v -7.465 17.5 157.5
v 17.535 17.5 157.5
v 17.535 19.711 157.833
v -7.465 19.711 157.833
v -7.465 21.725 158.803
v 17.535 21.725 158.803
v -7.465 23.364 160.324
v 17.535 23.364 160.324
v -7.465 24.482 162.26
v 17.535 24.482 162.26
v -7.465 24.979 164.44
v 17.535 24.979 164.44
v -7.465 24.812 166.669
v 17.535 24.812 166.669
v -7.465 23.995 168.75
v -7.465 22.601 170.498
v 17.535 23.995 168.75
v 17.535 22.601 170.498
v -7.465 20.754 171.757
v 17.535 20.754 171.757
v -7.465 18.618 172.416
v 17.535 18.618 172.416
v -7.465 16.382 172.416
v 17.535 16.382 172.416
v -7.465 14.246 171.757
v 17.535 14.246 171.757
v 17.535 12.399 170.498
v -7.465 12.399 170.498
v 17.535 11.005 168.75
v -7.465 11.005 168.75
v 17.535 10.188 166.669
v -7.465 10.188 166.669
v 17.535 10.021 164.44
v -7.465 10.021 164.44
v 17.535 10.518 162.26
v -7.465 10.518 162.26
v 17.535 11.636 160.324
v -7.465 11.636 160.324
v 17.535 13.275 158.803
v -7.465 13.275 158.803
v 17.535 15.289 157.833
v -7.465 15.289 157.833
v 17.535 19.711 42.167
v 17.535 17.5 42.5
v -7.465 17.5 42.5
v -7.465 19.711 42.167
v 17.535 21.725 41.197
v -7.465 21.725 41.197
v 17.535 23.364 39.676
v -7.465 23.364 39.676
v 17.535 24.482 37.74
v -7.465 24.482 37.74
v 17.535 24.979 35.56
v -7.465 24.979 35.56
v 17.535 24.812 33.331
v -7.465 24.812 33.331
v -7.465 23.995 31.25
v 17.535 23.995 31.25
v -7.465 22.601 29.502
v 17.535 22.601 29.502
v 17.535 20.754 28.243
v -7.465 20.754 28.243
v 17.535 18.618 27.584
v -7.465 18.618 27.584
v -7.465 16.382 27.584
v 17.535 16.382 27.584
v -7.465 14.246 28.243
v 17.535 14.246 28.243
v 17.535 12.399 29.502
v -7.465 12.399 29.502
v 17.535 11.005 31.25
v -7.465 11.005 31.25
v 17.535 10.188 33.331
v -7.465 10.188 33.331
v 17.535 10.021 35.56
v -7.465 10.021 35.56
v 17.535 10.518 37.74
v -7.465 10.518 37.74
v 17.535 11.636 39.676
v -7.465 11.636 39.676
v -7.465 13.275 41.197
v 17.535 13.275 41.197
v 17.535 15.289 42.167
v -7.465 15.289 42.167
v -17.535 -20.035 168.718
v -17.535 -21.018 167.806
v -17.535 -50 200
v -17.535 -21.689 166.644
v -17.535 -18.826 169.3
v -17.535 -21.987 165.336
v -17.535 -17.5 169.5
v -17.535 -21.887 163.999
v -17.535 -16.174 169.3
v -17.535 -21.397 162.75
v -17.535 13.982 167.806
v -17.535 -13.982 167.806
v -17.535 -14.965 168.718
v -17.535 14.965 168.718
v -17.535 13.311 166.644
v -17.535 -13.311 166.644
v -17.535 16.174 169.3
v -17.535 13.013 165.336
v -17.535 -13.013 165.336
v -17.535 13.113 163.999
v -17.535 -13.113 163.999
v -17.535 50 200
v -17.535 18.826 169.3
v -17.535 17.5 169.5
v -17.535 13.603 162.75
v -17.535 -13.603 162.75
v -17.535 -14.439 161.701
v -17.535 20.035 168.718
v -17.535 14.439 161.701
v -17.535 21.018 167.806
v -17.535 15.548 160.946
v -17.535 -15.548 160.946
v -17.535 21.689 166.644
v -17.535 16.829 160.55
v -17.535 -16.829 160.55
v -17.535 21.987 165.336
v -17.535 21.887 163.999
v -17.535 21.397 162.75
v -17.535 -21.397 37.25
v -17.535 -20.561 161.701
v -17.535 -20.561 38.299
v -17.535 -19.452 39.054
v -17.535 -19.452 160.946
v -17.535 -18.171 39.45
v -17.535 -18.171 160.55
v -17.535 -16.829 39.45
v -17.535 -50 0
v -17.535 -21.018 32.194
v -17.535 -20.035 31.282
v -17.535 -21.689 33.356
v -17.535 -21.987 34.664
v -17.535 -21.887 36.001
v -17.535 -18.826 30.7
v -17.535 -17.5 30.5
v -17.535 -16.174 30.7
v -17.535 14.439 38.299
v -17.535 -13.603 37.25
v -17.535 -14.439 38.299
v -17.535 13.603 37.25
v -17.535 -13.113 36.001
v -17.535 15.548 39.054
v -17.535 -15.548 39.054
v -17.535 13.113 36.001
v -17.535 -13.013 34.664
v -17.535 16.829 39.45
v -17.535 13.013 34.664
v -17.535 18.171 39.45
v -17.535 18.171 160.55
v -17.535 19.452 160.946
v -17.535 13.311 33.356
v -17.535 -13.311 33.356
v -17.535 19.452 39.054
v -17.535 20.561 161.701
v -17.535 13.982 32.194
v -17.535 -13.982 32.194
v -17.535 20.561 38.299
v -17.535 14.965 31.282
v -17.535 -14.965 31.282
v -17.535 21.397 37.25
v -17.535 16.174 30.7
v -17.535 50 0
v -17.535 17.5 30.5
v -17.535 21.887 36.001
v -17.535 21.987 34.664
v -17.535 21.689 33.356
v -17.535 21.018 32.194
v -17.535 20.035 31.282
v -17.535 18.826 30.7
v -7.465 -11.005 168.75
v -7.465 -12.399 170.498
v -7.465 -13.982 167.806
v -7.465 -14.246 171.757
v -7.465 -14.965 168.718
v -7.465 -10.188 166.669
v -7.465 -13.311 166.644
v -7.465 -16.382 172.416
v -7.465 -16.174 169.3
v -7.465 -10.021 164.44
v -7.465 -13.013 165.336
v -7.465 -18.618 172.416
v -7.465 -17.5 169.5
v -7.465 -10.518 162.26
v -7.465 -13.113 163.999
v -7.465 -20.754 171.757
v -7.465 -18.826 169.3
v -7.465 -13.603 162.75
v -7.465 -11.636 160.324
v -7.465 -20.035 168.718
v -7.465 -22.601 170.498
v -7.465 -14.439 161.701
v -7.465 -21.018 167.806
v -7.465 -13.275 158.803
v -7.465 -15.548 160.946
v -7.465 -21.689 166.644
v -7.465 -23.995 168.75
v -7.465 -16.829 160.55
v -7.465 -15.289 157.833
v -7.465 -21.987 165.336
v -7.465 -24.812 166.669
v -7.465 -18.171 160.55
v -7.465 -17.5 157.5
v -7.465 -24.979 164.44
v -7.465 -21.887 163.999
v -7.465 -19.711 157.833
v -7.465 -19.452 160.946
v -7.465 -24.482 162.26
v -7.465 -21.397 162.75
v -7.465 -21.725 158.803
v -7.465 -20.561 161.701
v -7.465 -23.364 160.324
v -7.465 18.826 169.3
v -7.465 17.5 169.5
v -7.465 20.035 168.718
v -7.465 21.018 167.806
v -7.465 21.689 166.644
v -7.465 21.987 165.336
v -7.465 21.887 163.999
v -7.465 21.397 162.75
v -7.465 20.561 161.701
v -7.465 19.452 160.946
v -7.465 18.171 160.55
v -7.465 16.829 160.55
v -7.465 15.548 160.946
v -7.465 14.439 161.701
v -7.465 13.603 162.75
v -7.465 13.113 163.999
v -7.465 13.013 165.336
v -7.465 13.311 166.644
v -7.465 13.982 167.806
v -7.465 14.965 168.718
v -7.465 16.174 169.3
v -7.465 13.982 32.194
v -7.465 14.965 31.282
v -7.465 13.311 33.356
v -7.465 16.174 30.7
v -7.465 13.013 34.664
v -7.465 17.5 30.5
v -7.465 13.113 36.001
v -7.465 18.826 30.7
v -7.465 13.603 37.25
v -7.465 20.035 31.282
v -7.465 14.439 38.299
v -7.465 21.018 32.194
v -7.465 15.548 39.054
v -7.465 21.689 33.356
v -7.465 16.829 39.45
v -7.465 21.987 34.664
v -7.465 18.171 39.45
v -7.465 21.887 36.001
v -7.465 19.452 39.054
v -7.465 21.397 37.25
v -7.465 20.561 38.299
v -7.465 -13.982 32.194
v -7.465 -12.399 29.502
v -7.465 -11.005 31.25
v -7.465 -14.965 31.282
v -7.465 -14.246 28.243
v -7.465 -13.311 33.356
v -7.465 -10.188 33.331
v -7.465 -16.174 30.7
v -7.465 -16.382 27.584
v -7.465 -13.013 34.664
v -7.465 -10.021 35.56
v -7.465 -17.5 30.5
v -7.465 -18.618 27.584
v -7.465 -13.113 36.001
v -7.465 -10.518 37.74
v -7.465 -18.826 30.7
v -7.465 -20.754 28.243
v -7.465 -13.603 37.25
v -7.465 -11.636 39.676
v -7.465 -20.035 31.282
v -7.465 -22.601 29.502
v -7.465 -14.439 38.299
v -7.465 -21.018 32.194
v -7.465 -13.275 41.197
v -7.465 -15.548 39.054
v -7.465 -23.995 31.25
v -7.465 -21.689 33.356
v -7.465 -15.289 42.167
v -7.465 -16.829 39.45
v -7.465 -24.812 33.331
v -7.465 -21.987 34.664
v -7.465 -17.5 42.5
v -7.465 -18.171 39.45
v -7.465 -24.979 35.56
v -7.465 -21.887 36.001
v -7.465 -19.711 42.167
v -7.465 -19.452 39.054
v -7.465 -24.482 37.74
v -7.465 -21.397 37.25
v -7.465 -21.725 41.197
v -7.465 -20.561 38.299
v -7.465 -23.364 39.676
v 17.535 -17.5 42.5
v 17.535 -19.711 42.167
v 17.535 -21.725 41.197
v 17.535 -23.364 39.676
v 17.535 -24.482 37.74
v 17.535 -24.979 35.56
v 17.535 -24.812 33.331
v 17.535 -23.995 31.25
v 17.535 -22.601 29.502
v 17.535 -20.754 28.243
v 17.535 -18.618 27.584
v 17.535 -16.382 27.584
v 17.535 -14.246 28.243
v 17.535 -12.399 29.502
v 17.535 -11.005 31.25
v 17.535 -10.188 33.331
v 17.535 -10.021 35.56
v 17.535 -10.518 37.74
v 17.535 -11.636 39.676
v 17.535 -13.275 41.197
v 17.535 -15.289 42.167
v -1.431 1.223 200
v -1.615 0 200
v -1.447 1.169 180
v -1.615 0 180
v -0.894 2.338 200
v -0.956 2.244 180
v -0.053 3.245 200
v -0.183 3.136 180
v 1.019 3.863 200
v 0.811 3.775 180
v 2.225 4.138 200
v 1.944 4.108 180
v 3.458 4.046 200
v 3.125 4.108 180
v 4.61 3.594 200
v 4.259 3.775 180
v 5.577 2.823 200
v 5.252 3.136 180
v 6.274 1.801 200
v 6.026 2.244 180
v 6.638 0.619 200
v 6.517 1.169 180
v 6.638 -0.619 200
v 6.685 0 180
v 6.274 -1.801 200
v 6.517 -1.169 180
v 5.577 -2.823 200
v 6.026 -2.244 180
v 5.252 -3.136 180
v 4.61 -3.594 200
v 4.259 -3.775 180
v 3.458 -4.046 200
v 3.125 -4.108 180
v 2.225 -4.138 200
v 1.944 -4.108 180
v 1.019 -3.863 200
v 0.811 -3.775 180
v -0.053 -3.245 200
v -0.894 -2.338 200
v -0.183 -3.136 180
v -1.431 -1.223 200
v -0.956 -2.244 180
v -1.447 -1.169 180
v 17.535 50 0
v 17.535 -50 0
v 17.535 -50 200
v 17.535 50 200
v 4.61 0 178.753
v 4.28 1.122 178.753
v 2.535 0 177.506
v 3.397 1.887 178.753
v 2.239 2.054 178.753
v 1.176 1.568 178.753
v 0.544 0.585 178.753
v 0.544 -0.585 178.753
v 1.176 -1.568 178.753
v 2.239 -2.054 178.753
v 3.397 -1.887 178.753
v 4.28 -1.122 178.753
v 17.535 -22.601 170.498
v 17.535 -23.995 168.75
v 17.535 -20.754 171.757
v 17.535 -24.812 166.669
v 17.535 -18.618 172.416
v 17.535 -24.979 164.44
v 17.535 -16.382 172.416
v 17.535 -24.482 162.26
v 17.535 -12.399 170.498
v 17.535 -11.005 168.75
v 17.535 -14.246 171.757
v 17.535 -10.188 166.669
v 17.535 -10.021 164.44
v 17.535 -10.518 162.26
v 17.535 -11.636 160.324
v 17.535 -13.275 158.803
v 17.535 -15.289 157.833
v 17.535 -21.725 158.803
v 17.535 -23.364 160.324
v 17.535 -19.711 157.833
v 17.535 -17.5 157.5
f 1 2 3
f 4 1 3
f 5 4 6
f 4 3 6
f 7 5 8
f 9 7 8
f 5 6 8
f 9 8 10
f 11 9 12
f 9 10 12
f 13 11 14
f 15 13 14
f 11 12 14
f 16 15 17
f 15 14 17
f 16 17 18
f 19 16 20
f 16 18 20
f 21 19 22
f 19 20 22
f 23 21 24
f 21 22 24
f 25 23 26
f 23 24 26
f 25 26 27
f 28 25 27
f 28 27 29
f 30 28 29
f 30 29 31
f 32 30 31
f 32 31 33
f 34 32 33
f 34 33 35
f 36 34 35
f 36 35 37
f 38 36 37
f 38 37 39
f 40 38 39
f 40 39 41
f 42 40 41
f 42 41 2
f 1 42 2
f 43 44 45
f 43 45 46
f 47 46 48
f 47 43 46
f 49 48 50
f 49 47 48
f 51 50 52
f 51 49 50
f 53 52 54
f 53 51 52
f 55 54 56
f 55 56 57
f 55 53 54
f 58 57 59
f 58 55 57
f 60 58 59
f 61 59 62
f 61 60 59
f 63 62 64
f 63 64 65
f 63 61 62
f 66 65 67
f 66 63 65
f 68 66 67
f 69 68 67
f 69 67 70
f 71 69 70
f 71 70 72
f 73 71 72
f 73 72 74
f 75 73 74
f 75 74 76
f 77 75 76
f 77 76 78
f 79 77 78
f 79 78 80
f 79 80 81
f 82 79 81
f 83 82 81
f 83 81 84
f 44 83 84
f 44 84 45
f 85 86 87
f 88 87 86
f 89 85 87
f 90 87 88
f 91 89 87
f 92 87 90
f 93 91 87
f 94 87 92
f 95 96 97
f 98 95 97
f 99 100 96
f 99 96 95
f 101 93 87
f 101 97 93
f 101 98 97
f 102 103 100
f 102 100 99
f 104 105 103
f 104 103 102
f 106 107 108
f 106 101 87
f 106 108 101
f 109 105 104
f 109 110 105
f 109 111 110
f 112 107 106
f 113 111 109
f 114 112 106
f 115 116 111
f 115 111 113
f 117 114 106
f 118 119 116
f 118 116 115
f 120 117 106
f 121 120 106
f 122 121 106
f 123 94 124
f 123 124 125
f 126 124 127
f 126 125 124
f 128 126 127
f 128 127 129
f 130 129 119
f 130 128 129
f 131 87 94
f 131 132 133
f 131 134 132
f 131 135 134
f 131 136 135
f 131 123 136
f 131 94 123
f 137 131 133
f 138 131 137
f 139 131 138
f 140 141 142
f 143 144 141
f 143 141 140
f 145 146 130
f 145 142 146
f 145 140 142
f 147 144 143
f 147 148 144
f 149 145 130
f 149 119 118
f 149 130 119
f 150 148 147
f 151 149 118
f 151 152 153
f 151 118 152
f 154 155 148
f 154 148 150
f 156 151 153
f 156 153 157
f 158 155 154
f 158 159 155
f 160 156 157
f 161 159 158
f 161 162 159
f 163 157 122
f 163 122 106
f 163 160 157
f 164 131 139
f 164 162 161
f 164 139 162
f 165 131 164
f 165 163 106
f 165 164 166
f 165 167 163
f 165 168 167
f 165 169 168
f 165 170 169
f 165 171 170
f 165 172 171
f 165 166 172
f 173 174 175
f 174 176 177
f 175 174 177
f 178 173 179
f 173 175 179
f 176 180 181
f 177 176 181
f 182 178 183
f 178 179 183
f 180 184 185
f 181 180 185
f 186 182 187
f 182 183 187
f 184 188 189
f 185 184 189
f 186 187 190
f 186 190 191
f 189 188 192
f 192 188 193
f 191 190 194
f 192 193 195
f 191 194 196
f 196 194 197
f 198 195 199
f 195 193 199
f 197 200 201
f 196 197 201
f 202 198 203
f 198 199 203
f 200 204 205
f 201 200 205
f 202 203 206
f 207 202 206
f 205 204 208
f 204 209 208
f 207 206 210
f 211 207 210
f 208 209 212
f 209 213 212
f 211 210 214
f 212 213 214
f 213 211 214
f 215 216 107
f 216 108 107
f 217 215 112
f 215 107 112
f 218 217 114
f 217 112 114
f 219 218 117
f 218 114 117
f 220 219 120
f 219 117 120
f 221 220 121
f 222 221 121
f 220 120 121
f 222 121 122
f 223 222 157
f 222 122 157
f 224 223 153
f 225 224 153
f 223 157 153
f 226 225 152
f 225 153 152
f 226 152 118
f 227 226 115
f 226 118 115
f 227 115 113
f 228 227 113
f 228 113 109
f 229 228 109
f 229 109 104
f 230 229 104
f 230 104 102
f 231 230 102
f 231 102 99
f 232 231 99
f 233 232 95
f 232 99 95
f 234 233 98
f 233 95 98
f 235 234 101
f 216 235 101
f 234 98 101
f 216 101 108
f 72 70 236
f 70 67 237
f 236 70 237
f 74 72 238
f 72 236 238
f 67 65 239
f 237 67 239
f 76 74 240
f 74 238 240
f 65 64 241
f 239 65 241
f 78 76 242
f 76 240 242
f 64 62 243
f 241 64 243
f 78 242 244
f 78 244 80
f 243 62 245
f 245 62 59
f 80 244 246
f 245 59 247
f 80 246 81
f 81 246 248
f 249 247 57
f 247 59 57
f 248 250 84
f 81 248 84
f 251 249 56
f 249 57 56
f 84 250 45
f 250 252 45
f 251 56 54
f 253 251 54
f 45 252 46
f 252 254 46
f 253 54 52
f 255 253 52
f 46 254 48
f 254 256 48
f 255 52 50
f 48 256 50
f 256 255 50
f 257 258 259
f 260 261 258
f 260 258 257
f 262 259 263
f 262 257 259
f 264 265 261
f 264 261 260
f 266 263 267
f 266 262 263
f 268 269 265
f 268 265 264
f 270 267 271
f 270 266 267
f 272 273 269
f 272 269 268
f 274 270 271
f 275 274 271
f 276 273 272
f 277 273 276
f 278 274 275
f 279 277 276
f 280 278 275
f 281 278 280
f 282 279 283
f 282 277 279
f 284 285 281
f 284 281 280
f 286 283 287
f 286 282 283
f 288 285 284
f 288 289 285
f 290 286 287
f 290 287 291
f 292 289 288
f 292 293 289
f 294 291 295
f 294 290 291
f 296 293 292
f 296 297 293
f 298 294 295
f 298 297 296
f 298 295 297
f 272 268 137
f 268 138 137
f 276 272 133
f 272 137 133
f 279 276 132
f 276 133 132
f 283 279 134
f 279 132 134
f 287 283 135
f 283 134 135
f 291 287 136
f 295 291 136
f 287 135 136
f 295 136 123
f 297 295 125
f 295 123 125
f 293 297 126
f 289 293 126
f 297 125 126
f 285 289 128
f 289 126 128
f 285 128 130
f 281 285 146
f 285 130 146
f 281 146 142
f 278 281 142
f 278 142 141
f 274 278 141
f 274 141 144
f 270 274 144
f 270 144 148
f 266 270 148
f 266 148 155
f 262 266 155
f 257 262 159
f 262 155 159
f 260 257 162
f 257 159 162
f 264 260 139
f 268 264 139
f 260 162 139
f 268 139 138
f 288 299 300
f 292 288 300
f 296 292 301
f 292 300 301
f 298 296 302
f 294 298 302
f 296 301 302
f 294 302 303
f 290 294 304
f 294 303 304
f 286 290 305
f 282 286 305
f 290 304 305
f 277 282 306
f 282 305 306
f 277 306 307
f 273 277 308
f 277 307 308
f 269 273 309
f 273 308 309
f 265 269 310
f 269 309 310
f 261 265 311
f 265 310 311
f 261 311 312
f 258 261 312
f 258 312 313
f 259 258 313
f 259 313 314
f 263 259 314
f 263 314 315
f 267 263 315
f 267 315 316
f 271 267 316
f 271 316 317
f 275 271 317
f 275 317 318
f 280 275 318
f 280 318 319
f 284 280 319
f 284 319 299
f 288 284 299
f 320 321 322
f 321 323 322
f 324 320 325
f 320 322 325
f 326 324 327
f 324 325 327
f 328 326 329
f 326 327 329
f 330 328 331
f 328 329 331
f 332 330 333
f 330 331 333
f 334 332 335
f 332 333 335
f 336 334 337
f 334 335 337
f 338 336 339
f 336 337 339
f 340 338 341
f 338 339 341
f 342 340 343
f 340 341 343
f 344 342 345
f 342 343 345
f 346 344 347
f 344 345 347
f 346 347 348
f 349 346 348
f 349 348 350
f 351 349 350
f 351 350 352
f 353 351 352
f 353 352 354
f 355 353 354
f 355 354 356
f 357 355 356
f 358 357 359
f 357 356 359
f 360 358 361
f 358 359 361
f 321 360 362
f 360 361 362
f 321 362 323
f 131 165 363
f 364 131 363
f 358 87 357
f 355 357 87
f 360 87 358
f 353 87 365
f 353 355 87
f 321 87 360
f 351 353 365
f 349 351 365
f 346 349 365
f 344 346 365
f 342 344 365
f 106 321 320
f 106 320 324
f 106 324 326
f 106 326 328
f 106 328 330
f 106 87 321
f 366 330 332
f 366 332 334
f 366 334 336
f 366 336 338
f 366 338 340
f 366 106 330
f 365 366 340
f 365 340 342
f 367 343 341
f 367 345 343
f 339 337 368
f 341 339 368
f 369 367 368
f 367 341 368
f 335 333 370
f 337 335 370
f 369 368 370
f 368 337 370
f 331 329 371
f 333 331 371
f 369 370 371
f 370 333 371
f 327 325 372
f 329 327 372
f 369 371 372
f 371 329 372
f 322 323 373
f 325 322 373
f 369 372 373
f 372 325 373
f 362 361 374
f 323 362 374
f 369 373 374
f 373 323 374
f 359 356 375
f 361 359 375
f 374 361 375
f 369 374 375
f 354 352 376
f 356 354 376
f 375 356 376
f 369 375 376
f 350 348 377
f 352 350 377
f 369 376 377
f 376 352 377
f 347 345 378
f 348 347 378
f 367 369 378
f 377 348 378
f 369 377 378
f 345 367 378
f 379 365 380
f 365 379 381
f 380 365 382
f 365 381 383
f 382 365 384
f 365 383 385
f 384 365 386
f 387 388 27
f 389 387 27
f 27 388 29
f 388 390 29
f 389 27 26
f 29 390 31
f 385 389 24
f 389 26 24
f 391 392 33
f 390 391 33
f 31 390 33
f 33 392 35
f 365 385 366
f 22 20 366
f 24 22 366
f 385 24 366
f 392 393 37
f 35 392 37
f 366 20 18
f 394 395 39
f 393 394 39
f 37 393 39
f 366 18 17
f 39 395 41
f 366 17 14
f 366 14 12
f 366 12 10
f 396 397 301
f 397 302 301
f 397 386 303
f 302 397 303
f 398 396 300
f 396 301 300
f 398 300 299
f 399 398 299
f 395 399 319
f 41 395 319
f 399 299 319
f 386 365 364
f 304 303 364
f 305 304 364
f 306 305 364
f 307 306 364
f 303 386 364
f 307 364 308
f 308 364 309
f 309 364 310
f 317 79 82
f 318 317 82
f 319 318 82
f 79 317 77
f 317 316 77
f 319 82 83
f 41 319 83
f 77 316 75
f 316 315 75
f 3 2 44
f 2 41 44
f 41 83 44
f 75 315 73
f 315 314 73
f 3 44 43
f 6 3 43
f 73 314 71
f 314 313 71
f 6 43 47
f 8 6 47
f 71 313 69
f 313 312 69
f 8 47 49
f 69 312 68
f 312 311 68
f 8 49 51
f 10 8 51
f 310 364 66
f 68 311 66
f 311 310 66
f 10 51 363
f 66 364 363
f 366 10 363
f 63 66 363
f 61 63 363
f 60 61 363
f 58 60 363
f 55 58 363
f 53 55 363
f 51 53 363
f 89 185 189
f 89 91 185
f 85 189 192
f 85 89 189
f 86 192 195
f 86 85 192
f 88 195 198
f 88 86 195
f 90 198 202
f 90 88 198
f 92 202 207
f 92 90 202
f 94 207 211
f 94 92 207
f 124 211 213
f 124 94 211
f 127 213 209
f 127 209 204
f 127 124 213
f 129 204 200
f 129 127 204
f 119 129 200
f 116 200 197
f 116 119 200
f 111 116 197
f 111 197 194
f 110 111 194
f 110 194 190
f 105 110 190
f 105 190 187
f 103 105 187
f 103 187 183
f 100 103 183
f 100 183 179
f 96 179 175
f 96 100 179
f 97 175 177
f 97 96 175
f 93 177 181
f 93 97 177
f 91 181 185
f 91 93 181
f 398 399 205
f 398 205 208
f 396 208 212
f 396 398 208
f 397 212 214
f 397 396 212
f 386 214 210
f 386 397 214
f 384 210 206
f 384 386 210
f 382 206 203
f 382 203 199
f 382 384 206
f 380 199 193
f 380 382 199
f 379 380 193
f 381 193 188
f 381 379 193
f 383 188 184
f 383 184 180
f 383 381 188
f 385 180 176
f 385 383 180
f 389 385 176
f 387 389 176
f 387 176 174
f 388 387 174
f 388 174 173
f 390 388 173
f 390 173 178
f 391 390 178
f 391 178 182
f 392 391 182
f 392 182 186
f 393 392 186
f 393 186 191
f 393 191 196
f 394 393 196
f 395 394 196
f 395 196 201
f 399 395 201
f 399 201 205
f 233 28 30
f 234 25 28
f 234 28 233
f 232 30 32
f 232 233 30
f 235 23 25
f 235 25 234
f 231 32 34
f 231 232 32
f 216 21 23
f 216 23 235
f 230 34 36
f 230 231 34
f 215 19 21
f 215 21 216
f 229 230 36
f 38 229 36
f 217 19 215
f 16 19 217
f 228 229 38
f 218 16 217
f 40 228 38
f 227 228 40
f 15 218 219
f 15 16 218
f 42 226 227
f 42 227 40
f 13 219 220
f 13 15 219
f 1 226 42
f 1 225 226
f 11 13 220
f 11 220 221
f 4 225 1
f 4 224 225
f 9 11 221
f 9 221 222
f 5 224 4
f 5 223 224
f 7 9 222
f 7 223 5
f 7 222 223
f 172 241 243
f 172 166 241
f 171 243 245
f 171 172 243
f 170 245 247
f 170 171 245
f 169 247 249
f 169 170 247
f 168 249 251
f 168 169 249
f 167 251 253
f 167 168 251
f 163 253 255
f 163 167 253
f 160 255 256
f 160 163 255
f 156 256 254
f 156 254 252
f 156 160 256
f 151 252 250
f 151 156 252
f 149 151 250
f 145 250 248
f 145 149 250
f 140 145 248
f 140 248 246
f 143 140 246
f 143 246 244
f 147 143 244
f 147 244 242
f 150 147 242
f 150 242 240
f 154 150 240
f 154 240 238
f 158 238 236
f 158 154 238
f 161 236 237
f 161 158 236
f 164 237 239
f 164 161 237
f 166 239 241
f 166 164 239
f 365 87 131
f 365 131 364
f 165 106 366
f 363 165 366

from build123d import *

# Parameters (mm, degrees)
SKIZZE1_W                                           = 35.06944
SKIZZE1_H                                           = 100
AUFSATZ_LINEAR_AUSTRAGEN1_DEPTH                     = 200
STIRNSENKUNG_F_R_M8_SENKSCHRAUBE_KOPF_B_D           = 9
STIRNSENKUNG_F_R_M8_SENKSCHRAUBE_KOPF_B_CBORE_D     = 15
STIRNSENKUNG_F_R_M8_SENKSCHRAUBE_KOPF_B_CBORE_DEPTH = 25
SPIEGELN4_COPY_1_D                                  = 9
SPIEGELN4_COPY_1_CBORE_D                            = 15
SPIEGELN4_COPY_1_CBORE_DEPTH                        = 25
KERNLOCH_F_R_M8_HELICOIL1_D                         = 8.3
KERNLOCH_F_R_M8_HELICOIL1_DEPTH                     = 20
KERNLOCH_F_R_M8_HELICOIL1_TIP                       = 2.493571569


with BuildPart() as part:
    # Skizze1 → Aufsatz-Linear austragen1 (new body)
    with BuildSketch(Plane.XY):
        Rectangle(SKIZZE1_W, SKIZZE1_H)
    extrude(amount=AUFSATZ_LINEAR_AUSTRAGEN1_DEPTH)

    # Stirnsenkung für M8 Senkschraube (Kopf Button)1 (through all)
    with Locations(Plane(origin=(17.53472, 0, 0), x_dir=(0, 0, -1), z_dir=(1, 0, 0))):
        with Locations((-165, 17.5)):
            stirnsenkung_f_r_m8_senkschraube_kopf_b = CounterBoreHole(STIRNSENKUNG_F_R_M8_SENKSCHRAUBE_KOPF_B_D / 2, STIRNSENKUNG_F_R_M8_SENKSCHRAUBE_KOPF_B_CBORE_D / 2, STIRNSENKUNG_F_R_M8_SENKSCHRAUBE_KOPF_B_CBORE_DEPTH)

    # Spiegeln3: Stirnsenkung für M8 Senkschraube (Kopf Button)1 across plane
    add(stirnsenkung_f_r_m8_senkschraube_kopf_b.mirror(Plane.XY.offset(100)), mode=Mode.SUBTRACT)

    # Spiegeln4: Stirnsenkung für M8 Senkschraube (Kopf Button)1 across plane
    add(stirnsenkung_f_r_m8_senkschraube_kopf_b.mirror(Plane.ZX), mode=Mode.SUBTRACT)

    # Spiegeln4 copy 1 (through all)
    with Locations(Plane(origin=(17.53472, 0, 200), x_dir=(0, 0, 1), z_dir=(1, 0, 0))):
        with Locations((-165, 17.5)):
            CounterBoreHole(SPIEGELN4_COPY_1_D / 2, SPIEGELN4_COPY_1_CBORE_D / 2, SPIEGELN4_COPY_1_CBORE_DEPTH)

    # Kernloch für M8 Helicoil1
    with Locations(Plane.XY.offset(200)):
        with Locations((2.53472, 0)):
            Hole(KERNLOCH_F_R_M8_HELICOIL1_D / 2, depth=KERNLOCH_F_R_M8_HELICOIL1_DEPTH)
            with Locations((0, 0, -(KERNLOCH_F_R_M8_HELICOIL1_DEPTH + KERNLOCH_F_R_M8_HELICOIL1_TIP / 2))):  # 118° drill point
                Cone(0, KERNLOCH_F_R_M8_HELICOIL1_D / 2, KERNLOCH_F_R_M8_HELICOIL1_TIP, mode=Mode.SUBTRACT)


solid = part.part
